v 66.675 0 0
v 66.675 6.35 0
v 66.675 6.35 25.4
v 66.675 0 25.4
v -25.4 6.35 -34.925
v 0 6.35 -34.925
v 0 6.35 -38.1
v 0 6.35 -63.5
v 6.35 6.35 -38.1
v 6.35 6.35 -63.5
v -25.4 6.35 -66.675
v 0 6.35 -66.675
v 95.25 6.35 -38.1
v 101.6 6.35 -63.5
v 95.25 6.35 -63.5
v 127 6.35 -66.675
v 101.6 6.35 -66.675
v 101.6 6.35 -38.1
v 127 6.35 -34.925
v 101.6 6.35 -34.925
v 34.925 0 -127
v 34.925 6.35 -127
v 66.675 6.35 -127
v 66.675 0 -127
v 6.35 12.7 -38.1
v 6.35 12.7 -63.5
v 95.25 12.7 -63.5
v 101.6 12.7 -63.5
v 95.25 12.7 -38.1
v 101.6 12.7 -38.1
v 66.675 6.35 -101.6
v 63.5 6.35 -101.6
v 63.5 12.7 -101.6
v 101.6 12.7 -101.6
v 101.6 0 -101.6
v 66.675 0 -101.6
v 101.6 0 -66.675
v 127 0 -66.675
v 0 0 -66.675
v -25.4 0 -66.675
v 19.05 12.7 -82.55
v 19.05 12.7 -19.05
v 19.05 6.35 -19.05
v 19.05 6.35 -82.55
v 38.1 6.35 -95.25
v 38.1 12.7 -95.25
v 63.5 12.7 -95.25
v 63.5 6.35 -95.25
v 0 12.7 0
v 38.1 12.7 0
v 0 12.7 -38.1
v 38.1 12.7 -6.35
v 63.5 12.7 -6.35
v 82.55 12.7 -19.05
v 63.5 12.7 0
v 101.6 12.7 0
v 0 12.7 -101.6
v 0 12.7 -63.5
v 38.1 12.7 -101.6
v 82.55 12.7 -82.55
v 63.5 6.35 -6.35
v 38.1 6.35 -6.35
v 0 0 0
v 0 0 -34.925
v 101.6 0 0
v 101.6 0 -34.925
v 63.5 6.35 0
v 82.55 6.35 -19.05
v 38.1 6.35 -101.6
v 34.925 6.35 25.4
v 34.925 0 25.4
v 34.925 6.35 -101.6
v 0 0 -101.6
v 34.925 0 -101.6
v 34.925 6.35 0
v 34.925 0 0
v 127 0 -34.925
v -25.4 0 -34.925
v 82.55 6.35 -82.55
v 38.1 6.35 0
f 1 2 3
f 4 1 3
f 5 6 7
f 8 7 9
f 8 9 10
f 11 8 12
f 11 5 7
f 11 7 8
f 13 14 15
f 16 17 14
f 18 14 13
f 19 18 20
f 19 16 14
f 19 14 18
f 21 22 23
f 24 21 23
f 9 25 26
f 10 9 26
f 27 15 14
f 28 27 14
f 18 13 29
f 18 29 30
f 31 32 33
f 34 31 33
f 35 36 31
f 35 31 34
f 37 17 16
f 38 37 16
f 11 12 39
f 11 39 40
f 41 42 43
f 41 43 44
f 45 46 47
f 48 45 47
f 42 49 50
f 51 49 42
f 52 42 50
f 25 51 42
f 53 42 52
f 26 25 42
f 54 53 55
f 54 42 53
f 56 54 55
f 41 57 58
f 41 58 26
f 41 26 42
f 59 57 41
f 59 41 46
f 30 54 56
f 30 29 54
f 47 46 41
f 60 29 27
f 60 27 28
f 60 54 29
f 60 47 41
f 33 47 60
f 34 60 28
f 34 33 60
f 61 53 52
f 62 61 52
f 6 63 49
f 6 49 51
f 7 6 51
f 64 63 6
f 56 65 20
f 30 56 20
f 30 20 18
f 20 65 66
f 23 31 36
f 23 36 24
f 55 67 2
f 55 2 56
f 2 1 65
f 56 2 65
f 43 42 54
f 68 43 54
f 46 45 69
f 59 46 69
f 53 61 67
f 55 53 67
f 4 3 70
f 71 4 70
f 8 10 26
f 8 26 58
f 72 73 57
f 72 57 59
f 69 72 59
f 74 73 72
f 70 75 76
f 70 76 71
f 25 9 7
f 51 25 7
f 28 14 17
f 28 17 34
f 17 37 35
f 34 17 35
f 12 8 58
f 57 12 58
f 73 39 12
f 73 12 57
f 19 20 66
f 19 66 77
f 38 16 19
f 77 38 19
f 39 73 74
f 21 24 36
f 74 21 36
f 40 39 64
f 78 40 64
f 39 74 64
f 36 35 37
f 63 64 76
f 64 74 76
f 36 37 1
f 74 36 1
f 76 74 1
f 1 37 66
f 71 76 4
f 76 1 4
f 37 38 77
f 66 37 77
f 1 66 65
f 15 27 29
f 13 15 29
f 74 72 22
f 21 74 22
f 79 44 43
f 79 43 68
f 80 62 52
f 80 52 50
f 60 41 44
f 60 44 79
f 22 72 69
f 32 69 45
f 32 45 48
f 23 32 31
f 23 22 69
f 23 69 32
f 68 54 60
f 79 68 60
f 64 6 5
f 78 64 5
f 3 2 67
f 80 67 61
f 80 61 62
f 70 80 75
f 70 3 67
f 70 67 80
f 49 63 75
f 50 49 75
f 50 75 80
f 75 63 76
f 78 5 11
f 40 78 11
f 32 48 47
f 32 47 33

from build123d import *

# Parameters (mm, degrees)
SKETCH1_W           = 101.6
SKETCH1_H           = 101.6
BOSS_EXTRUDE1_DEPTH = 12.7
SKETCH7_W           = 63.5
SKETCH7_H           = 63.5
CUT_EXTRUDE2_DEPTH  = 6.35
SKETCH8_W           = 25.4
SKETCH8_H           = 6.35
CUT_EXTRUDE3_DEPTH  = 6.35
CIRPATTERN2_COUNT   = 4
BOSS_EXTRUDE3_START = -6.35
SKETCH9_W           = 31.75
SKETCH9_H           = 25.4
BOSS_EXTRUDE3_DEPTH = 6.35
CIRPATTERN3_COUNT   = 4


with BuildPart() as part:
    # Sketch1 → Boss-Extrude1 (new body)
    with BuildSketch(Plane(origin=(0, 0, 0), x_dir=(1, 0, 0), z_dir=(0, 1, 0))):
        with Locations((50.8, 50.8)):
            Rectangle(SKETCH1_W, SKETCH1_H)
    extrude(amount=BOSS_EXTRUDE1_DEPTH)

    # Sketch7 → Cut-Extrude2 (cut)
    with BuildSketch(Plane(origin=(0, 12.7, 0), x_dir=(1, 0, 0), z_dir=(0, 1, 0))):
        with Locations((50.8, 50.8)):
            Rectangle(SKETCH7_W, SKETCH7_H)
    extrude(amount=-CUT_EXTRUDE2_DEPTH, mode=Mode.SUBTRACT)

    # Sketch8 → Cut-Extrude3 (cut)
    with BuildSketch(Plane(origin=(0, 12.7, 0), x_dir=(1, 0, 0), z_dir=(0, 1, 0))):
        with Locations((50.8, 98.425)):
            Rectangle(SKETCH8_W, SKETCH8_H)
    cut_extrude3 = extrude(amount=-CUT_EXTRUDE3_DEPTH, mode=Mode.SUBTRACT)

    # CirPattern2: Cut-Extrude3 ×4 about axis
    cirpattern2_axis = Axis((50.8, 6.35, -50.8), (0, 1, 0))
    for i in range(1, CIRPATTERN2_COUNT):
        add(cut_extrude3.rotate(cirpattern2_axis, i * 360 / CIRPATTERN2_COUNT), mode=Mode.SUBTRACT)

    # Sketch9 → Boss-Extrude3 (add)
    with BuildSketch(Plane(origin=(0, 12.7, 0), x_dir=(1, 0, 0), z_dir=(0, 1, 0)).offset(BOSS_EXTRUDE3_START)):
        with Locations((50.8, 114.3)):
            Rectangle(SKETCH9_W, SKETCH9_H)
    boss_extrude3 = extrude(amount=-BOSS_EXTRUDE3_DEPTH)

    # CirPattern3: Boss-Extrude3 ×4 about axis
    cirpattern3_axis = Axis((50.8, 6.35, -50.8), (0, 1, 0))
    for i in range(1, CIRPATTERN3_COUNT):
        add(boss_extrude3.rotate(cirpattern3_axis, i * 360 / CIRPATTERN3_COUNT))


solid = part.part
